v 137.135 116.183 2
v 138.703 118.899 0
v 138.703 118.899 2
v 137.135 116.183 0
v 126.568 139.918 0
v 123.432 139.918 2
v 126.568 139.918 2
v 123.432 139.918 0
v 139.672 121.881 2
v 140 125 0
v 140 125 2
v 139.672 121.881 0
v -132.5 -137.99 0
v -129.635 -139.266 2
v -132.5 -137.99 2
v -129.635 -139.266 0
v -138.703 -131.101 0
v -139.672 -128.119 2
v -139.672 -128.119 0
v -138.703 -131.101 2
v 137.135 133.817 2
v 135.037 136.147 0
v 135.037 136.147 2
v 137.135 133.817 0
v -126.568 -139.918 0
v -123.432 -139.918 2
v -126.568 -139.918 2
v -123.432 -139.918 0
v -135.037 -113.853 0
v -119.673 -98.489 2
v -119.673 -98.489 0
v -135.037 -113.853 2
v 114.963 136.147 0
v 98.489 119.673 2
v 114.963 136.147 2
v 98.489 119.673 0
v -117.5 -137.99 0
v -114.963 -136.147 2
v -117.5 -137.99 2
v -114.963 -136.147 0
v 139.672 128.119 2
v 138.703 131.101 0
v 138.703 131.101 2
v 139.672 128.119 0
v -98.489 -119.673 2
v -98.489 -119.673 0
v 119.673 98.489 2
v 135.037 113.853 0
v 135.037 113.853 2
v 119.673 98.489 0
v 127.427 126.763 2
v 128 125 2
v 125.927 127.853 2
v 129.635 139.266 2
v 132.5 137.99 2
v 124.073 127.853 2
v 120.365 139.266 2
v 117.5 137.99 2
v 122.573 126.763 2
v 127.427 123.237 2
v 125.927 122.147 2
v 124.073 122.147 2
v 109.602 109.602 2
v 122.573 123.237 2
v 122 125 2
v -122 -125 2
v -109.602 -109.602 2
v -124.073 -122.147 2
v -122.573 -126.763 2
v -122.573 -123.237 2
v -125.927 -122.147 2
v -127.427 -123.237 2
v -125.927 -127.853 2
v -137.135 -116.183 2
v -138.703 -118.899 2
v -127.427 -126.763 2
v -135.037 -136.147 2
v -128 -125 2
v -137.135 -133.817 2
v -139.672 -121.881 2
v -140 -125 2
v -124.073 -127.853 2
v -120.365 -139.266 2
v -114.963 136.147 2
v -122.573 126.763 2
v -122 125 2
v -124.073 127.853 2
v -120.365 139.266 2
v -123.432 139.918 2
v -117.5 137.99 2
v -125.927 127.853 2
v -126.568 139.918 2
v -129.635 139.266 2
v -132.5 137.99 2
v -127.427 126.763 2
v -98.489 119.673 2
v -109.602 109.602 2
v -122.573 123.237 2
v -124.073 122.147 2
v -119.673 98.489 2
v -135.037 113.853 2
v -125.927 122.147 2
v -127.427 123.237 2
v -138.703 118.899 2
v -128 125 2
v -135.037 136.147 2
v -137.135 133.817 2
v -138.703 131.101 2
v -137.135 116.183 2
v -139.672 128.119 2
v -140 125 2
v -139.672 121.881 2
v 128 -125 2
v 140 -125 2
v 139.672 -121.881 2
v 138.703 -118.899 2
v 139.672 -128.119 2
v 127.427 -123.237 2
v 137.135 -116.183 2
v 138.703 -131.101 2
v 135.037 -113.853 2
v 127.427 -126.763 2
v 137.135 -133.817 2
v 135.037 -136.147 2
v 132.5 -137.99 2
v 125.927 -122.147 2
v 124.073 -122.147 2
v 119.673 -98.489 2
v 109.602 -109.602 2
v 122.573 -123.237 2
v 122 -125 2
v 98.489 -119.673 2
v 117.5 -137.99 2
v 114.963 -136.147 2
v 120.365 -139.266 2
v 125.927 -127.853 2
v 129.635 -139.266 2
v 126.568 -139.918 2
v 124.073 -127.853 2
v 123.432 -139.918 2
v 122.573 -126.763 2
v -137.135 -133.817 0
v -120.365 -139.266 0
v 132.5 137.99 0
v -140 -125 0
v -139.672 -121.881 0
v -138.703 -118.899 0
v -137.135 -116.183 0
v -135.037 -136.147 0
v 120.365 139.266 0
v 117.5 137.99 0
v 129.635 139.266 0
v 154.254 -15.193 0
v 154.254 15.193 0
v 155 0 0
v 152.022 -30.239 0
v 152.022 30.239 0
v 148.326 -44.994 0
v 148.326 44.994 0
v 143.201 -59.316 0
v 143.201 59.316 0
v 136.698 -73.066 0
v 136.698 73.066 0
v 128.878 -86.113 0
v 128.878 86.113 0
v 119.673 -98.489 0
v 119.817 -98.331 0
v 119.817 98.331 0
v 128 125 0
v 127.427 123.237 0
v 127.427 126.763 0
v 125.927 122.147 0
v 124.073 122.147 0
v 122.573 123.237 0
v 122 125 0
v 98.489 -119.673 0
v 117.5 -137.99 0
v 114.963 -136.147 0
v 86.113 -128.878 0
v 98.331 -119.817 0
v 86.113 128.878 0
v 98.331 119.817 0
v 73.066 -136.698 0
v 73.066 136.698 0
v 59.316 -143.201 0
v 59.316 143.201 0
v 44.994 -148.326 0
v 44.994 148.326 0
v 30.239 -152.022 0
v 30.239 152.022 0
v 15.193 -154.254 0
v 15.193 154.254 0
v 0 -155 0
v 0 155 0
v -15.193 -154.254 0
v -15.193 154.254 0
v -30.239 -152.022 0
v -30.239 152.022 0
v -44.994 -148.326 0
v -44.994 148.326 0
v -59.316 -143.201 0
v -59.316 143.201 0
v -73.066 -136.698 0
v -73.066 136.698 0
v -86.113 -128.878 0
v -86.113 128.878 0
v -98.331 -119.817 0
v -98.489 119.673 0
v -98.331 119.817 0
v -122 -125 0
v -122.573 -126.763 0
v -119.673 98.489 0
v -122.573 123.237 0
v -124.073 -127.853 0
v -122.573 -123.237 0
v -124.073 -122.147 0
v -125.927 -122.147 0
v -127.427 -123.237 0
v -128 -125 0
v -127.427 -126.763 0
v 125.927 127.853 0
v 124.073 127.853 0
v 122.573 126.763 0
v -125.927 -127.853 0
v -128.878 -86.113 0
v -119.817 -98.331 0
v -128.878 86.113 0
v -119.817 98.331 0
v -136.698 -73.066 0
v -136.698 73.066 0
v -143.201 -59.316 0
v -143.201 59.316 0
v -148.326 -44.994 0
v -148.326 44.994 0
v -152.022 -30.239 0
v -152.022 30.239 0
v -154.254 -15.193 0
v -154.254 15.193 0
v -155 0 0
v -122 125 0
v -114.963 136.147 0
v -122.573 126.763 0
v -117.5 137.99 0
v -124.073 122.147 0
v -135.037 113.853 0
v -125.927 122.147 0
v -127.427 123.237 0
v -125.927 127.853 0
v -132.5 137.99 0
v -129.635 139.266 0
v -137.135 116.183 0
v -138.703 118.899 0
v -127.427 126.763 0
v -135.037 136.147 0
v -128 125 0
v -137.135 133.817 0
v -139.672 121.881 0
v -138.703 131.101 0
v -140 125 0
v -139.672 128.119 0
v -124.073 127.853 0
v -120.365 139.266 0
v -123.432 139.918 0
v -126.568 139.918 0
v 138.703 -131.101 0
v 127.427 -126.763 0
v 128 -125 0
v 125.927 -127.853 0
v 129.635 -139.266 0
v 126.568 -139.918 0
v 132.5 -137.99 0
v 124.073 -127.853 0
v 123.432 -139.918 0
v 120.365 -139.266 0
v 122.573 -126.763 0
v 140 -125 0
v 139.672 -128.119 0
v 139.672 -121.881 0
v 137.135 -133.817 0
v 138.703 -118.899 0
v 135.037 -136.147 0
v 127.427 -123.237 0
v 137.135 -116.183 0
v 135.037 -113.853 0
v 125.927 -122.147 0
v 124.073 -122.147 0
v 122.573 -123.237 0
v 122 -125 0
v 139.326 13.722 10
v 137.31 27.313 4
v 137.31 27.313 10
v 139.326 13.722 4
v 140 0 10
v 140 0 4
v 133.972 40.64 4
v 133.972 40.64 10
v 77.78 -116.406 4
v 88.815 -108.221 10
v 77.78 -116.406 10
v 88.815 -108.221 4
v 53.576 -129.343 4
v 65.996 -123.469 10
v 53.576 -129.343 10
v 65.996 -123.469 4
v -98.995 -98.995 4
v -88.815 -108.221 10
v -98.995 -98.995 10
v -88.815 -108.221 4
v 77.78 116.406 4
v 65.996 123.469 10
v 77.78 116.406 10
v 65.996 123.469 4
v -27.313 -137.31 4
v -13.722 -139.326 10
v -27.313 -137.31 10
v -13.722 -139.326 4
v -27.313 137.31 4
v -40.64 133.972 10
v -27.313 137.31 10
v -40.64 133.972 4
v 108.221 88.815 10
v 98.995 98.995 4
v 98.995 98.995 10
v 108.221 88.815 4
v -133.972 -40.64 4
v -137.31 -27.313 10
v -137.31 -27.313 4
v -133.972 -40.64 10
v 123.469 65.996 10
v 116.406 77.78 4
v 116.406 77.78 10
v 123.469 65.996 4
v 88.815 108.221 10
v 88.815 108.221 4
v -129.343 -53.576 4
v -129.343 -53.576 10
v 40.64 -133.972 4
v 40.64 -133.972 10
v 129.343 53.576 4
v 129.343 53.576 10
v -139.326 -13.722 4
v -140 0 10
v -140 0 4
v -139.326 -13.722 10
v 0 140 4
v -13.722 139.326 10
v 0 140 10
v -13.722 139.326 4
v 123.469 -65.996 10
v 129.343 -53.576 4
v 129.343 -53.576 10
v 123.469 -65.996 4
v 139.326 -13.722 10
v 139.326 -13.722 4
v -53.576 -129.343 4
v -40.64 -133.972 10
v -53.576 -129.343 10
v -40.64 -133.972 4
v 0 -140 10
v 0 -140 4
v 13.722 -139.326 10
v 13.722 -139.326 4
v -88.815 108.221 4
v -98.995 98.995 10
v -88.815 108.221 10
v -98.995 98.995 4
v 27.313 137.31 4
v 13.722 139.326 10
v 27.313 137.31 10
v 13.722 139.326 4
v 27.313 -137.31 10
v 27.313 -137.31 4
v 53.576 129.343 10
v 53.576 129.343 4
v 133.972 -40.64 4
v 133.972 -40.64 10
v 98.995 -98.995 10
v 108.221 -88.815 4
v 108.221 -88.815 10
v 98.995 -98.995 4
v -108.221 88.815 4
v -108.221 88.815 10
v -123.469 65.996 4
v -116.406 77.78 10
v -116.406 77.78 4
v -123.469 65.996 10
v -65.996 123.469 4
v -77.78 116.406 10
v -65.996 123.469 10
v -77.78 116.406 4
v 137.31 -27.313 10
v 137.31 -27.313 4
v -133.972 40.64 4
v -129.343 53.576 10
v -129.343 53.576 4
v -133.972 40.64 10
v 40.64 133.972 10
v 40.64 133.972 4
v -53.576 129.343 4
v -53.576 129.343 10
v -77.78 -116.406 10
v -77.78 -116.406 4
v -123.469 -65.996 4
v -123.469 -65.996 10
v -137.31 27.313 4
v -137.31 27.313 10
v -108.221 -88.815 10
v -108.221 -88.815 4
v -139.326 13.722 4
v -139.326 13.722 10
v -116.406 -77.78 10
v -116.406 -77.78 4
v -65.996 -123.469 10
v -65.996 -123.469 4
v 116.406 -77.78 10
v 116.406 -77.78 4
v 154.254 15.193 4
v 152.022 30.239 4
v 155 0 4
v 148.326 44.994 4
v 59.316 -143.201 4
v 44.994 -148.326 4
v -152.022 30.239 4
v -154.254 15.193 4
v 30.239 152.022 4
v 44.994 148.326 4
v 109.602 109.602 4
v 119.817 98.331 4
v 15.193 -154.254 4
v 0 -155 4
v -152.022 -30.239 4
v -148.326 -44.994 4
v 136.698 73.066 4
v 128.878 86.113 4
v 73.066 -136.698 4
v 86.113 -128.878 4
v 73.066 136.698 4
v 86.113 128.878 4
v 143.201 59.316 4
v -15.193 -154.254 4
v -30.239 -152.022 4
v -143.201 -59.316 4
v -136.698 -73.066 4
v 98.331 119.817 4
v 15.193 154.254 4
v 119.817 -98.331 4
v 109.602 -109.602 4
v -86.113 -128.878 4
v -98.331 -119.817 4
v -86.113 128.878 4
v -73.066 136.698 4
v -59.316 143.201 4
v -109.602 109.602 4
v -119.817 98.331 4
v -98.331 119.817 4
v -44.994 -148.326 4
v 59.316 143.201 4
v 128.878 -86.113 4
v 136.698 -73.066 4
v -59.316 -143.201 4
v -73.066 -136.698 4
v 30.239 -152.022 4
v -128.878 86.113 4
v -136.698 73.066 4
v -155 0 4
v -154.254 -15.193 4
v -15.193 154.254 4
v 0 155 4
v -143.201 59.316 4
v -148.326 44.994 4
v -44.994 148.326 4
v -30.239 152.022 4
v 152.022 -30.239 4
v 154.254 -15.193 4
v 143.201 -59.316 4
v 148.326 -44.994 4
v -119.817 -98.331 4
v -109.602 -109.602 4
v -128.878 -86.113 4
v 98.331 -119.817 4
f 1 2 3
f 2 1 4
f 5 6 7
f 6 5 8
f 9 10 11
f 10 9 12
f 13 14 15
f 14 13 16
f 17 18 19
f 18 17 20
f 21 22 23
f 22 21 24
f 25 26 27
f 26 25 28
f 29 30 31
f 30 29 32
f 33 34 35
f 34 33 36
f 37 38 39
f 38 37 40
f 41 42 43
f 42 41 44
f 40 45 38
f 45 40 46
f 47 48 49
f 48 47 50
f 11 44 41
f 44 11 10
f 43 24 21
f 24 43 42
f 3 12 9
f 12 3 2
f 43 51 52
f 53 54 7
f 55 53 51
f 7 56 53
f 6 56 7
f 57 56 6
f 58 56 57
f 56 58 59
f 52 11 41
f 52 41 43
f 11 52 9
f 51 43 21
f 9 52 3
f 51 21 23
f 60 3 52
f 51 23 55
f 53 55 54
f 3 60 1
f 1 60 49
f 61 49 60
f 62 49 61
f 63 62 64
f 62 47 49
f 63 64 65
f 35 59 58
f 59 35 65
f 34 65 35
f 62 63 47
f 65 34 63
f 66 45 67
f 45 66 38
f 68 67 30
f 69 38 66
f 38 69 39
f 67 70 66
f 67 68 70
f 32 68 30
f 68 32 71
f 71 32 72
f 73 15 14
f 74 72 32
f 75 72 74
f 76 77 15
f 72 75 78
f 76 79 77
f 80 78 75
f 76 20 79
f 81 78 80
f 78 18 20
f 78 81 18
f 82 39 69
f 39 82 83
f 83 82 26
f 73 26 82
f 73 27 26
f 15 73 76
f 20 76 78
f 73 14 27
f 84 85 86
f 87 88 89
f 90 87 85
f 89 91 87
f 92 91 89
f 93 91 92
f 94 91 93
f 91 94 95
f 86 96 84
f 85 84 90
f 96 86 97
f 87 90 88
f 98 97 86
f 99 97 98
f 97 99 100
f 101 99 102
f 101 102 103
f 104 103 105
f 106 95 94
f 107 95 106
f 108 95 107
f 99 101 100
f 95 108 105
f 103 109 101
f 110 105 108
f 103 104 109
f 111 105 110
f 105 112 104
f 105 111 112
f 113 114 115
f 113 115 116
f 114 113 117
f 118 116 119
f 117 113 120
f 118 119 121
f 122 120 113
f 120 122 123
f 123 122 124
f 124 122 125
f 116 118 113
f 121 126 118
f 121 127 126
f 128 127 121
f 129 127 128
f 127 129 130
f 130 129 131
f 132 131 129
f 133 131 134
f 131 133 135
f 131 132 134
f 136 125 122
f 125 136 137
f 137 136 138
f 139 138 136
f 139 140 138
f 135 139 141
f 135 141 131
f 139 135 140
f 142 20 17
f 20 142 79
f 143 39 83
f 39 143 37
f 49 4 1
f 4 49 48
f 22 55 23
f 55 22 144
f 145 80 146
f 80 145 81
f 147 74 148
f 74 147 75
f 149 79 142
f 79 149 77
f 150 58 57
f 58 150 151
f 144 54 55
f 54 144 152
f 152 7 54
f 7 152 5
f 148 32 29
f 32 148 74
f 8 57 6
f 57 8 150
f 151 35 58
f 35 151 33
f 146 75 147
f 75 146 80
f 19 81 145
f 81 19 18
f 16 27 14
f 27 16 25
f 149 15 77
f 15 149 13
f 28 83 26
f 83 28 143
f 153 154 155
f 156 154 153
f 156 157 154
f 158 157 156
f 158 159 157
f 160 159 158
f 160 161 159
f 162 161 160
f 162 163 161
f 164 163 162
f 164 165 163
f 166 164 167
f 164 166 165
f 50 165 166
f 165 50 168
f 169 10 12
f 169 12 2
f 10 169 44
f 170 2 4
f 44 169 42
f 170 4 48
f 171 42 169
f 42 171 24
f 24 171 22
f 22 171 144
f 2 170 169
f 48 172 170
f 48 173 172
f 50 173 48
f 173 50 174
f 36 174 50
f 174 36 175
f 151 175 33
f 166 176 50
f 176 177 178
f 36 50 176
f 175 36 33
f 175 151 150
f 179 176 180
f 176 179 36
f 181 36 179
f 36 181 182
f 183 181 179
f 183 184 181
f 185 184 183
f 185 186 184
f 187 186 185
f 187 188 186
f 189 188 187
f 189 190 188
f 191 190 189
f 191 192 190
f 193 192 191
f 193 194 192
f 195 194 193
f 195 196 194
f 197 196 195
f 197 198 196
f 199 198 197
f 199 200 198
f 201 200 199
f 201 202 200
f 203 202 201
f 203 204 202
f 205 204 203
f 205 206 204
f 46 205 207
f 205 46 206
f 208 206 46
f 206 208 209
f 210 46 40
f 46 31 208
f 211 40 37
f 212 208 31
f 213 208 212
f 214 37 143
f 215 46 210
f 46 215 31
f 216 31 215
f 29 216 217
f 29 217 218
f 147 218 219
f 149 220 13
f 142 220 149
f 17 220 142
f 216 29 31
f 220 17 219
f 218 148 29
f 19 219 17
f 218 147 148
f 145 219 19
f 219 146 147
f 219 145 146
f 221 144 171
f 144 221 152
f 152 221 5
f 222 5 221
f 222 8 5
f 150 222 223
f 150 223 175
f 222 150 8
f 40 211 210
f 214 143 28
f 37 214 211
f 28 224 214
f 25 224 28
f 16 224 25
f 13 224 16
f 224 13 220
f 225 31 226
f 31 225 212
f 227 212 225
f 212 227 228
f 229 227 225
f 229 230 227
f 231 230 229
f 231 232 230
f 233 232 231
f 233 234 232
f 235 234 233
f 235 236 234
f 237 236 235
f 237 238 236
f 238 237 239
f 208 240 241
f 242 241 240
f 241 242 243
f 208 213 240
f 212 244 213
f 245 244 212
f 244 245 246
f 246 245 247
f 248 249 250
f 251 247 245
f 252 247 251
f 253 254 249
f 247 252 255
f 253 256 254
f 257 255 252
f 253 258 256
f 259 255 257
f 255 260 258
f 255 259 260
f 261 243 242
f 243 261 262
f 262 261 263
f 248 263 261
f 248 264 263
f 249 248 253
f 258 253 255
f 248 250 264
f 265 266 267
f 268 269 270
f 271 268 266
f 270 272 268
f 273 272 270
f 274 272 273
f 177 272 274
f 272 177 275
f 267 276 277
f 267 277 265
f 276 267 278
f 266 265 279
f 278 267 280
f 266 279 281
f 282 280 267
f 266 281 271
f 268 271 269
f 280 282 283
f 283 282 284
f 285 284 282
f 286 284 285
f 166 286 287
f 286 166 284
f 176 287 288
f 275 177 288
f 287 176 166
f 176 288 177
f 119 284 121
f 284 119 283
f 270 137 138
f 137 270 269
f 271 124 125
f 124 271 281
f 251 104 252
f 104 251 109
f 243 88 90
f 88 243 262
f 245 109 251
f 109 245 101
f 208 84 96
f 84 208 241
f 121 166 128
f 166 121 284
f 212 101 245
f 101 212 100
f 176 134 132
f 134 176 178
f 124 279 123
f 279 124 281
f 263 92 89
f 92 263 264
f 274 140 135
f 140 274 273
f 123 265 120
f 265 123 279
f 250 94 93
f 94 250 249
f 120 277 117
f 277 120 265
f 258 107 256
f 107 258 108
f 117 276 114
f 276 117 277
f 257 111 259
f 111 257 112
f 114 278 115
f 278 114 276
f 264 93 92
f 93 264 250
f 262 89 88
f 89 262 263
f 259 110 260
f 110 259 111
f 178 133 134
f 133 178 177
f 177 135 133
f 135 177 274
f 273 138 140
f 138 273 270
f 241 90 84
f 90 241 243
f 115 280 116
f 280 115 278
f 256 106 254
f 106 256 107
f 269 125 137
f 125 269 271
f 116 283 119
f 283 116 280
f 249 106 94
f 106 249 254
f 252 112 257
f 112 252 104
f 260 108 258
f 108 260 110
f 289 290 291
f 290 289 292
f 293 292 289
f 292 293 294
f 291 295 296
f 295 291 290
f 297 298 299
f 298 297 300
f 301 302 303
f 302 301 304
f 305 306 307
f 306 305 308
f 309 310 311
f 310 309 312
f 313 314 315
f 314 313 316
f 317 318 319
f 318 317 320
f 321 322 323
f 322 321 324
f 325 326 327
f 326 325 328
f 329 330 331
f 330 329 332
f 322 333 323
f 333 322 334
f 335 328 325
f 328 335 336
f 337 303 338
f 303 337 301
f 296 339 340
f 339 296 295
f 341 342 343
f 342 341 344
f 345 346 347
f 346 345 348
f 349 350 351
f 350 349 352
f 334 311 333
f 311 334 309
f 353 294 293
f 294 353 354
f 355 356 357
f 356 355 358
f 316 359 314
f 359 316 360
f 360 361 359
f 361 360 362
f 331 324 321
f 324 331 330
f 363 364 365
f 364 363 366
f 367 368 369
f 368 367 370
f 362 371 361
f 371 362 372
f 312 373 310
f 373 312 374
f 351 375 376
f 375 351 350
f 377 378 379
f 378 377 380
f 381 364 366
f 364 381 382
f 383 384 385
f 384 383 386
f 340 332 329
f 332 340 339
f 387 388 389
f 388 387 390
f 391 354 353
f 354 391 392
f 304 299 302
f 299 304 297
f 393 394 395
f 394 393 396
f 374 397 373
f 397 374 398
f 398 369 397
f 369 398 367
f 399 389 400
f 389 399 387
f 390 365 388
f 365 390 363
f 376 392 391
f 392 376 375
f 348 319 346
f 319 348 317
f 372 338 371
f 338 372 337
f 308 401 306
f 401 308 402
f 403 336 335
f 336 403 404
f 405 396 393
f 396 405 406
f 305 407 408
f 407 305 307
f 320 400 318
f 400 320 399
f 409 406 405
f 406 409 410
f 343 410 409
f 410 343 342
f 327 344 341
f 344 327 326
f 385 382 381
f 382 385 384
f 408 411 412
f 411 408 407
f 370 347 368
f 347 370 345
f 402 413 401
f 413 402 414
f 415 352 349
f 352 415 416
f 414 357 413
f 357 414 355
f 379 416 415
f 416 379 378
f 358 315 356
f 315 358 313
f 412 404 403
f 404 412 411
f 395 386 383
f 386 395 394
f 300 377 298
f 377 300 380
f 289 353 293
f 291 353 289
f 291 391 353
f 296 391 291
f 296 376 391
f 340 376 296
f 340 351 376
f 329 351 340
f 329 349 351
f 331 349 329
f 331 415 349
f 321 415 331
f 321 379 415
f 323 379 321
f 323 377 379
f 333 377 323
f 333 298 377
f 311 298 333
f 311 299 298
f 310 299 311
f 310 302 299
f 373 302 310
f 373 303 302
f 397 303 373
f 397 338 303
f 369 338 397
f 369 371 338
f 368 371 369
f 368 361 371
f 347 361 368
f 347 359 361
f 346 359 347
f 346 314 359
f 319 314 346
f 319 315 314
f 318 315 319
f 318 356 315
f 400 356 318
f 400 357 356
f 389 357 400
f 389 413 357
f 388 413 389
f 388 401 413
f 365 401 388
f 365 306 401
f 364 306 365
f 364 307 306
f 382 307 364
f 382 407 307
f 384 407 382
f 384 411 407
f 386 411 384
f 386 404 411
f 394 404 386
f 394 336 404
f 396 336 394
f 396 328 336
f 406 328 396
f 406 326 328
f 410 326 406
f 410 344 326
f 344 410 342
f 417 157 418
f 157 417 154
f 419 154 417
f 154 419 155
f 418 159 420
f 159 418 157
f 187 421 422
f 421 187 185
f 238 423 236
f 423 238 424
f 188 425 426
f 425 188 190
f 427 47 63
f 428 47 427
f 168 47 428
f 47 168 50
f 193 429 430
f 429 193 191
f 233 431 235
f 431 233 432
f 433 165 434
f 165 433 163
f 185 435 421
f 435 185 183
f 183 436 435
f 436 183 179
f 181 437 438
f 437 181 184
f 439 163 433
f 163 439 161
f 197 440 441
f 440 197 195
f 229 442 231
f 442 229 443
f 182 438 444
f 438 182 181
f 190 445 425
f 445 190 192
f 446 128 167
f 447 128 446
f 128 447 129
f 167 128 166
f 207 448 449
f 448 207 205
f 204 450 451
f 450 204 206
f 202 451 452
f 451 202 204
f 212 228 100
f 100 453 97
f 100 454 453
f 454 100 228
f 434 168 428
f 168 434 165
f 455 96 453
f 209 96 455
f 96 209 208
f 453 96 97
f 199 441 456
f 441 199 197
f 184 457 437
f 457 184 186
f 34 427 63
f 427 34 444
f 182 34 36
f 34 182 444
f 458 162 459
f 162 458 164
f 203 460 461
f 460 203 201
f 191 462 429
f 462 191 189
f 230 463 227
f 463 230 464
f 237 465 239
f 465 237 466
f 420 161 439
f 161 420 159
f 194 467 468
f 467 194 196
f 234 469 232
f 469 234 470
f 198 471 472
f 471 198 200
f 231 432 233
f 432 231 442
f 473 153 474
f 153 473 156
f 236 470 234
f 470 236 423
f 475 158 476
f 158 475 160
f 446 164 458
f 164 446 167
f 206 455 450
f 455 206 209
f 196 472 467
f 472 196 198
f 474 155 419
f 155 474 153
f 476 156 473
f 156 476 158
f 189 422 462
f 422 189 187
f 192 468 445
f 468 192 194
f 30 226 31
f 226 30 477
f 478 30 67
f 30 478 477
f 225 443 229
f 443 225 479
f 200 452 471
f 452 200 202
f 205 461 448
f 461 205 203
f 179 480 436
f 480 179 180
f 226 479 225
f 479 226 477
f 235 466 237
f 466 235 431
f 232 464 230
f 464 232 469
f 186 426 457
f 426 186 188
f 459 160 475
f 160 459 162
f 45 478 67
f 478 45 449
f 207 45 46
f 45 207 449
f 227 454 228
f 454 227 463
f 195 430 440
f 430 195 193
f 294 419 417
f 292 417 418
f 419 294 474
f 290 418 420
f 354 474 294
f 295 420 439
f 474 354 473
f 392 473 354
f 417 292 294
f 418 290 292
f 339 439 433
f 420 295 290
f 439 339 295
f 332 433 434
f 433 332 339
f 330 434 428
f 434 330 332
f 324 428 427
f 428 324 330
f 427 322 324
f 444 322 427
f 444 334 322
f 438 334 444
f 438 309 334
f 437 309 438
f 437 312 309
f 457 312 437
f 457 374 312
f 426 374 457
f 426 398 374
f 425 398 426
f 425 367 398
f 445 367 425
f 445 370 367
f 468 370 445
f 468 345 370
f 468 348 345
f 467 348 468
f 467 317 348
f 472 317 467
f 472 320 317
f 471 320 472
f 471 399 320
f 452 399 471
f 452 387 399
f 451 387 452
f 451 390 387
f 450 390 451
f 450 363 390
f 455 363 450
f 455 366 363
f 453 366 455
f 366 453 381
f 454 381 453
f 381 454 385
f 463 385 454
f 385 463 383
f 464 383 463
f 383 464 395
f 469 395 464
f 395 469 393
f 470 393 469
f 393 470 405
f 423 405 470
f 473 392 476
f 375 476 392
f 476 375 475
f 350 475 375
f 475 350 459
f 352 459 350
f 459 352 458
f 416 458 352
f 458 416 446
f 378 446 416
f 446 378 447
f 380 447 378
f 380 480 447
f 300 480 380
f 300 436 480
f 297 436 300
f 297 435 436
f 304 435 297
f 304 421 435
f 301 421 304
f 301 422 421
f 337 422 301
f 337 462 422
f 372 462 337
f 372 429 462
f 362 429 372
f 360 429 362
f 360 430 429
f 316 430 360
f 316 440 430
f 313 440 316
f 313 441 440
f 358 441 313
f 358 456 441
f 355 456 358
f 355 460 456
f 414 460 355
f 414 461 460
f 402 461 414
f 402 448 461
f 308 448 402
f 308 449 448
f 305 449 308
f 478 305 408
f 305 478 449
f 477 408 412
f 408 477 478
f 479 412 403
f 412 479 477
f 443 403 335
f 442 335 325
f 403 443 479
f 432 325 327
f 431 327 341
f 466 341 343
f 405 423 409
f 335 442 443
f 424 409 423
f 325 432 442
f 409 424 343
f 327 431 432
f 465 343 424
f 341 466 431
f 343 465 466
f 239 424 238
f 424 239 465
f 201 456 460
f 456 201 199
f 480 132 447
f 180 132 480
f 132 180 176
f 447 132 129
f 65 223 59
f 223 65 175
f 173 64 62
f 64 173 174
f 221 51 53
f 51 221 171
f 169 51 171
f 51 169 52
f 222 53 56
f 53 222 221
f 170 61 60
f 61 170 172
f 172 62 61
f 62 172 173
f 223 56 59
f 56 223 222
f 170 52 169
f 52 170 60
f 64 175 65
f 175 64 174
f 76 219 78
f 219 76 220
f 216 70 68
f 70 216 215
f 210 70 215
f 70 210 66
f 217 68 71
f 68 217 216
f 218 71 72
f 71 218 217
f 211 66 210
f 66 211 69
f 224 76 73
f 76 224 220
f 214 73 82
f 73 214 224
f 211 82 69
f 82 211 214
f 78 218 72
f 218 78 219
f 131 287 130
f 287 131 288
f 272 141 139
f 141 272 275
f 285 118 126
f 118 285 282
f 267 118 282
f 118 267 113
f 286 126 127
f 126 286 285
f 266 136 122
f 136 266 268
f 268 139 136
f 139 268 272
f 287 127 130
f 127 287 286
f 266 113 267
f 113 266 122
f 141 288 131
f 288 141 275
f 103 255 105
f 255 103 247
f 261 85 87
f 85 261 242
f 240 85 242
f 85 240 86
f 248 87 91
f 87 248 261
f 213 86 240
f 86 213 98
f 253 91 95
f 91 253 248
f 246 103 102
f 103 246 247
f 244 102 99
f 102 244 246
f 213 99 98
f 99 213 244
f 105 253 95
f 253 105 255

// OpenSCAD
// This is an initial design for the front window
// for the BornHack StopNu light.
// Z dimension is only indicative to show the
// three construction elements
// X and Y dimensions are exact.
//

TAB_X_POSITION = 125;
TAB_Y_POSITION = 125;
TAB_ROUNDING = 15;
WINDOW_DIAMETER = 280;
SEALING_LIP_WIDTH = 15;
MOUNT_HOLE_DIAMETER = 6; // M6 bolts

WINDOW_RADIUS = WINDOW_DIAMETER / 2;
MOUNT_HOLE_RADIUS = MOUNT_HOLE_DIAMETER / 2;

difference () {
    union() {
 // mounting tab upper right + lower left
        hull() {
            translate([TAB_X_POSITION, TAB_Y_POSITION, 0]) {
                cylinder(h=2, r=TAB_ROUNDING);
            }
            translate([-TAB_X_POSITION, -TAB_Y_POSITION, 0]) {
                cylinder(h=2, r=TAB_ROUNDING);
            }
        }
 // mounting tab upper left + lower right       
        hull () {
            translate([TAB_X_POSITION, -TAB_Y_POSITION, 0]) {
                cylinder(h=2, r=TAB_ROUNDING);
            }
            translate([-TAB_X_POSITION, TAB_Y_POSITION, 0]) {
                cylinder(h=2, r=TAB_ROUNDING);
            }
        }
 // front glass, diameter 280mm
        cylinder(h=10, r=WINDOW_RADIUS, $fn=64);
 // sealing lip, diameter 310mm       
        cylinder(h=4, r=WINDOW_RADIUS + SEALING_LIP_WIDTH, $fn=64);
    }
 // holes in mounting tabs for M6 bolts    
    translate([TAB_X_POSITION, TAB_Y_POSITION, -5]) {
        cylinder(h=10, r=MOUNT_HOLE_RADIUS);
    }
    translate([-TAB_X_POSITION, -TAB_Y_POSITION, -5]) {
        cylinder(h=10, r=MOUNT_HOLE_RADIUS);
    }
    translate([TAB_X_POSITION, -TAB_Y_POSITION, -5]) {
        cylinder(h=10, r=MOUNT_HOLE_RADIUS);
    }
    translate([-TAB_X_POSITION, TAB_Y_POSITION, -5]) {
        cylinder(h=10, r=MOUNT_HOLE_RADIUS);
    }
}
